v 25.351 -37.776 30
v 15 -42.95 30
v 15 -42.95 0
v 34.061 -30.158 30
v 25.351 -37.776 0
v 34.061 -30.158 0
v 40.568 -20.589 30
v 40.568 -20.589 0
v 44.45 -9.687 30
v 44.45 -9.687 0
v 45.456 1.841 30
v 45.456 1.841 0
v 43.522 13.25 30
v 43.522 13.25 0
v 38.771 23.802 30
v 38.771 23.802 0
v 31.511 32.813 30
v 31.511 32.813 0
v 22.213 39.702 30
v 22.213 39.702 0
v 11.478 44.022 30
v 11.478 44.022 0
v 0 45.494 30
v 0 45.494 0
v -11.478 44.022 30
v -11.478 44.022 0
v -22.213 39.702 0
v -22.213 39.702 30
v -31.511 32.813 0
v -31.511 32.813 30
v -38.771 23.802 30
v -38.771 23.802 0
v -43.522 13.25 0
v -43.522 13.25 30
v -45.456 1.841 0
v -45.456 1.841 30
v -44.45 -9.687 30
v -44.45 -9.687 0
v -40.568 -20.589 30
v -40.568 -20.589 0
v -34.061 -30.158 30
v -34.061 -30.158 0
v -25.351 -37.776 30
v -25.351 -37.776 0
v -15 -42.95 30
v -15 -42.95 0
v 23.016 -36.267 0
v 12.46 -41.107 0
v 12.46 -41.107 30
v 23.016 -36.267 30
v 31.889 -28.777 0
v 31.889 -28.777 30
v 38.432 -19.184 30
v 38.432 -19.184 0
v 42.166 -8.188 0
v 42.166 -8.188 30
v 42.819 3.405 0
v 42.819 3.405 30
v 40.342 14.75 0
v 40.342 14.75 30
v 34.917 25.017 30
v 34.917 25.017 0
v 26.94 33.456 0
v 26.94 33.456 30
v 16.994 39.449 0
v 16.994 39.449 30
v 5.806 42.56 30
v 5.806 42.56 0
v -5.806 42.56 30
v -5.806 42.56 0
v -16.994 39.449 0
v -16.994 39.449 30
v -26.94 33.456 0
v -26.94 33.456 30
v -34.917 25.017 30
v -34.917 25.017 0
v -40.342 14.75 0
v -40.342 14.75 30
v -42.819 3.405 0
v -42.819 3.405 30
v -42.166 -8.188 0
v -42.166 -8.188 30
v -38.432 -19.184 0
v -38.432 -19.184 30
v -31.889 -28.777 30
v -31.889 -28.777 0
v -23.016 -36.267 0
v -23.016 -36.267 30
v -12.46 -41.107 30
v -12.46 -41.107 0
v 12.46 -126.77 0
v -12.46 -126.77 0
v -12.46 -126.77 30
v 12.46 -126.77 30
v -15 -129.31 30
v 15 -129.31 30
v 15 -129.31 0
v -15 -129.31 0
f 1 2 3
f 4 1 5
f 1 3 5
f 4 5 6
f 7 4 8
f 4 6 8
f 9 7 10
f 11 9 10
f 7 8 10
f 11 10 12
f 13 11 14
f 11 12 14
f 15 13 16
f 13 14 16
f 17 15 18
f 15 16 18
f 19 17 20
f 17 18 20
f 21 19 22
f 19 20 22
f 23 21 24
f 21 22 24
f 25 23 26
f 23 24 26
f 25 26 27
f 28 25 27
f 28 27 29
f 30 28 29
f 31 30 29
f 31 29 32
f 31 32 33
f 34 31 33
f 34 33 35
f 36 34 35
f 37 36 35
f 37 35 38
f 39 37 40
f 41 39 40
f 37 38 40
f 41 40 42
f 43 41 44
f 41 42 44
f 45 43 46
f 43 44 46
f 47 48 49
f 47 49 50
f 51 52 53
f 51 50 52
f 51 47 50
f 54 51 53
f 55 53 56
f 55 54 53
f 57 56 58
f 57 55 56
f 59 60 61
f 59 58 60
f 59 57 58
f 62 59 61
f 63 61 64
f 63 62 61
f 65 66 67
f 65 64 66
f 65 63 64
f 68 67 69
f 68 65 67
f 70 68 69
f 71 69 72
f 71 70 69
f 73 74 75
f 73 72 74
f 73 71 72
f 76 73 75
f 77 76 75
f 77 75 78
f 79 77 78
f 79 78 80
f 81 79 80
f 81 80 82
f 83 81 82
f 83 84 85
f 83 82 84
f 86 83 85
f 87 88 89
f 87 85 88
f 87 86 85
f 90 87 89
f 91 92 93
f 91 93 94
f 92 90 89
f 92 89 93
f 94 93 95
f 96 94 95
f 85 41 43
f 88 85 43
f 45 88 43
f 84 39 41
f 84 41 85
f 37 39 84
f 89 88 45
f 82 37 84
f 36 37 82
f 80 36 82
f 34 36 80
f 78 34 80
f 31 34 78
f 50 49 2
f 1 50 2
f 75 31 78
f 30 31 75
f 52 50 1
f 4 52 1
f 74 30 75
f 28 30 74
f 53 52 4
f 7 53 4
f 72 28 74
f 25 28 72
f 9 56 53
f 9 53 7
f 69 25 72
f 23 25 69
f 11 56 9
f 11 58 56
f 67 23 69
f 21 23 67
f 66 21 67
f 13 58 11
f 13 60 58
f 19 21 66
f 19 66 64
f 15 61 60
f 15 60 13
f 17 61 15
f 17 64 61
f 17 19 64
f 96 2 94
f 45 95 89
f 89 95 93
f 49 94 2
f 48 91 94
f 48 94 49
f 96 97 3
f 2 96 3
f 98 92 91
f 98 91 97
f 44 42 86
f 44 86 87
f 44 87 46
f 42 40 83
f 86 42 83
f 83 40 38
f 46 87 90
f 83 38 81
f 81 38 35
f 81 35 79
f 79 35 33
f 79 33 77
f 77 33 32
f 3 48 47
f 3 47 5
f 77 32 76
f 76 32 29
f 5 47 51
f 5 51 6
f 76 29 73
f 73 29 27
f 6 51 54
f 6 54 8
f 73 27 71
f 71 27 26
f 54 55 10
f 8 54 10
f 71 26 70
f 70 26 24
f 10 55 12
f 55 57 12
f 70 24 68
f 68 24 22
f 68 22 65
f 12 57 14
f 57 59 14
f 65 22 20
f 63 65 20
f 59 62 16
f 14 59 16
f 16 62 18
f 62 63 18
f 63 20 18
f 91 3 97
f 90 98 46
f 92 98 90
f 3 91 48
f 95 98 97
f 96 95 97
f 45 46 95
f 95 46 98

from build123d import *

# Parameters (mm, degrees)
F1_DEPTH = 30
F2_T     = -2.54


with BuildPart() as f1:
    # F0 (on Top) → F1 (new body)
    with BuildSketch(Plane.XY):
        with BuildLine():
            Line((15, -129.3097395662), (15, -42.9497395662))
            ThreePointArc((15, -42.9497395662), (0, 45.4937372481), (-15, -42.9497395662))
            Line((-15, -42.9497395662), (-15, -129.3097395662))
            Line((-15, -129.3097395662), (15, -129.3097395662))
        make_face()
    extrude(amount=F1_DEPTH)

    # F2
    f2_openings = [f1.faces().sort_by_distance(p)[0] for p in [
        (0, -24.43063, 30),
        (0, -24.43063, 0),
    ]]
    offset(amount=F2_T, openings=f2_openings, kind=Kind.INTERSECTION)


solid = f1.part
